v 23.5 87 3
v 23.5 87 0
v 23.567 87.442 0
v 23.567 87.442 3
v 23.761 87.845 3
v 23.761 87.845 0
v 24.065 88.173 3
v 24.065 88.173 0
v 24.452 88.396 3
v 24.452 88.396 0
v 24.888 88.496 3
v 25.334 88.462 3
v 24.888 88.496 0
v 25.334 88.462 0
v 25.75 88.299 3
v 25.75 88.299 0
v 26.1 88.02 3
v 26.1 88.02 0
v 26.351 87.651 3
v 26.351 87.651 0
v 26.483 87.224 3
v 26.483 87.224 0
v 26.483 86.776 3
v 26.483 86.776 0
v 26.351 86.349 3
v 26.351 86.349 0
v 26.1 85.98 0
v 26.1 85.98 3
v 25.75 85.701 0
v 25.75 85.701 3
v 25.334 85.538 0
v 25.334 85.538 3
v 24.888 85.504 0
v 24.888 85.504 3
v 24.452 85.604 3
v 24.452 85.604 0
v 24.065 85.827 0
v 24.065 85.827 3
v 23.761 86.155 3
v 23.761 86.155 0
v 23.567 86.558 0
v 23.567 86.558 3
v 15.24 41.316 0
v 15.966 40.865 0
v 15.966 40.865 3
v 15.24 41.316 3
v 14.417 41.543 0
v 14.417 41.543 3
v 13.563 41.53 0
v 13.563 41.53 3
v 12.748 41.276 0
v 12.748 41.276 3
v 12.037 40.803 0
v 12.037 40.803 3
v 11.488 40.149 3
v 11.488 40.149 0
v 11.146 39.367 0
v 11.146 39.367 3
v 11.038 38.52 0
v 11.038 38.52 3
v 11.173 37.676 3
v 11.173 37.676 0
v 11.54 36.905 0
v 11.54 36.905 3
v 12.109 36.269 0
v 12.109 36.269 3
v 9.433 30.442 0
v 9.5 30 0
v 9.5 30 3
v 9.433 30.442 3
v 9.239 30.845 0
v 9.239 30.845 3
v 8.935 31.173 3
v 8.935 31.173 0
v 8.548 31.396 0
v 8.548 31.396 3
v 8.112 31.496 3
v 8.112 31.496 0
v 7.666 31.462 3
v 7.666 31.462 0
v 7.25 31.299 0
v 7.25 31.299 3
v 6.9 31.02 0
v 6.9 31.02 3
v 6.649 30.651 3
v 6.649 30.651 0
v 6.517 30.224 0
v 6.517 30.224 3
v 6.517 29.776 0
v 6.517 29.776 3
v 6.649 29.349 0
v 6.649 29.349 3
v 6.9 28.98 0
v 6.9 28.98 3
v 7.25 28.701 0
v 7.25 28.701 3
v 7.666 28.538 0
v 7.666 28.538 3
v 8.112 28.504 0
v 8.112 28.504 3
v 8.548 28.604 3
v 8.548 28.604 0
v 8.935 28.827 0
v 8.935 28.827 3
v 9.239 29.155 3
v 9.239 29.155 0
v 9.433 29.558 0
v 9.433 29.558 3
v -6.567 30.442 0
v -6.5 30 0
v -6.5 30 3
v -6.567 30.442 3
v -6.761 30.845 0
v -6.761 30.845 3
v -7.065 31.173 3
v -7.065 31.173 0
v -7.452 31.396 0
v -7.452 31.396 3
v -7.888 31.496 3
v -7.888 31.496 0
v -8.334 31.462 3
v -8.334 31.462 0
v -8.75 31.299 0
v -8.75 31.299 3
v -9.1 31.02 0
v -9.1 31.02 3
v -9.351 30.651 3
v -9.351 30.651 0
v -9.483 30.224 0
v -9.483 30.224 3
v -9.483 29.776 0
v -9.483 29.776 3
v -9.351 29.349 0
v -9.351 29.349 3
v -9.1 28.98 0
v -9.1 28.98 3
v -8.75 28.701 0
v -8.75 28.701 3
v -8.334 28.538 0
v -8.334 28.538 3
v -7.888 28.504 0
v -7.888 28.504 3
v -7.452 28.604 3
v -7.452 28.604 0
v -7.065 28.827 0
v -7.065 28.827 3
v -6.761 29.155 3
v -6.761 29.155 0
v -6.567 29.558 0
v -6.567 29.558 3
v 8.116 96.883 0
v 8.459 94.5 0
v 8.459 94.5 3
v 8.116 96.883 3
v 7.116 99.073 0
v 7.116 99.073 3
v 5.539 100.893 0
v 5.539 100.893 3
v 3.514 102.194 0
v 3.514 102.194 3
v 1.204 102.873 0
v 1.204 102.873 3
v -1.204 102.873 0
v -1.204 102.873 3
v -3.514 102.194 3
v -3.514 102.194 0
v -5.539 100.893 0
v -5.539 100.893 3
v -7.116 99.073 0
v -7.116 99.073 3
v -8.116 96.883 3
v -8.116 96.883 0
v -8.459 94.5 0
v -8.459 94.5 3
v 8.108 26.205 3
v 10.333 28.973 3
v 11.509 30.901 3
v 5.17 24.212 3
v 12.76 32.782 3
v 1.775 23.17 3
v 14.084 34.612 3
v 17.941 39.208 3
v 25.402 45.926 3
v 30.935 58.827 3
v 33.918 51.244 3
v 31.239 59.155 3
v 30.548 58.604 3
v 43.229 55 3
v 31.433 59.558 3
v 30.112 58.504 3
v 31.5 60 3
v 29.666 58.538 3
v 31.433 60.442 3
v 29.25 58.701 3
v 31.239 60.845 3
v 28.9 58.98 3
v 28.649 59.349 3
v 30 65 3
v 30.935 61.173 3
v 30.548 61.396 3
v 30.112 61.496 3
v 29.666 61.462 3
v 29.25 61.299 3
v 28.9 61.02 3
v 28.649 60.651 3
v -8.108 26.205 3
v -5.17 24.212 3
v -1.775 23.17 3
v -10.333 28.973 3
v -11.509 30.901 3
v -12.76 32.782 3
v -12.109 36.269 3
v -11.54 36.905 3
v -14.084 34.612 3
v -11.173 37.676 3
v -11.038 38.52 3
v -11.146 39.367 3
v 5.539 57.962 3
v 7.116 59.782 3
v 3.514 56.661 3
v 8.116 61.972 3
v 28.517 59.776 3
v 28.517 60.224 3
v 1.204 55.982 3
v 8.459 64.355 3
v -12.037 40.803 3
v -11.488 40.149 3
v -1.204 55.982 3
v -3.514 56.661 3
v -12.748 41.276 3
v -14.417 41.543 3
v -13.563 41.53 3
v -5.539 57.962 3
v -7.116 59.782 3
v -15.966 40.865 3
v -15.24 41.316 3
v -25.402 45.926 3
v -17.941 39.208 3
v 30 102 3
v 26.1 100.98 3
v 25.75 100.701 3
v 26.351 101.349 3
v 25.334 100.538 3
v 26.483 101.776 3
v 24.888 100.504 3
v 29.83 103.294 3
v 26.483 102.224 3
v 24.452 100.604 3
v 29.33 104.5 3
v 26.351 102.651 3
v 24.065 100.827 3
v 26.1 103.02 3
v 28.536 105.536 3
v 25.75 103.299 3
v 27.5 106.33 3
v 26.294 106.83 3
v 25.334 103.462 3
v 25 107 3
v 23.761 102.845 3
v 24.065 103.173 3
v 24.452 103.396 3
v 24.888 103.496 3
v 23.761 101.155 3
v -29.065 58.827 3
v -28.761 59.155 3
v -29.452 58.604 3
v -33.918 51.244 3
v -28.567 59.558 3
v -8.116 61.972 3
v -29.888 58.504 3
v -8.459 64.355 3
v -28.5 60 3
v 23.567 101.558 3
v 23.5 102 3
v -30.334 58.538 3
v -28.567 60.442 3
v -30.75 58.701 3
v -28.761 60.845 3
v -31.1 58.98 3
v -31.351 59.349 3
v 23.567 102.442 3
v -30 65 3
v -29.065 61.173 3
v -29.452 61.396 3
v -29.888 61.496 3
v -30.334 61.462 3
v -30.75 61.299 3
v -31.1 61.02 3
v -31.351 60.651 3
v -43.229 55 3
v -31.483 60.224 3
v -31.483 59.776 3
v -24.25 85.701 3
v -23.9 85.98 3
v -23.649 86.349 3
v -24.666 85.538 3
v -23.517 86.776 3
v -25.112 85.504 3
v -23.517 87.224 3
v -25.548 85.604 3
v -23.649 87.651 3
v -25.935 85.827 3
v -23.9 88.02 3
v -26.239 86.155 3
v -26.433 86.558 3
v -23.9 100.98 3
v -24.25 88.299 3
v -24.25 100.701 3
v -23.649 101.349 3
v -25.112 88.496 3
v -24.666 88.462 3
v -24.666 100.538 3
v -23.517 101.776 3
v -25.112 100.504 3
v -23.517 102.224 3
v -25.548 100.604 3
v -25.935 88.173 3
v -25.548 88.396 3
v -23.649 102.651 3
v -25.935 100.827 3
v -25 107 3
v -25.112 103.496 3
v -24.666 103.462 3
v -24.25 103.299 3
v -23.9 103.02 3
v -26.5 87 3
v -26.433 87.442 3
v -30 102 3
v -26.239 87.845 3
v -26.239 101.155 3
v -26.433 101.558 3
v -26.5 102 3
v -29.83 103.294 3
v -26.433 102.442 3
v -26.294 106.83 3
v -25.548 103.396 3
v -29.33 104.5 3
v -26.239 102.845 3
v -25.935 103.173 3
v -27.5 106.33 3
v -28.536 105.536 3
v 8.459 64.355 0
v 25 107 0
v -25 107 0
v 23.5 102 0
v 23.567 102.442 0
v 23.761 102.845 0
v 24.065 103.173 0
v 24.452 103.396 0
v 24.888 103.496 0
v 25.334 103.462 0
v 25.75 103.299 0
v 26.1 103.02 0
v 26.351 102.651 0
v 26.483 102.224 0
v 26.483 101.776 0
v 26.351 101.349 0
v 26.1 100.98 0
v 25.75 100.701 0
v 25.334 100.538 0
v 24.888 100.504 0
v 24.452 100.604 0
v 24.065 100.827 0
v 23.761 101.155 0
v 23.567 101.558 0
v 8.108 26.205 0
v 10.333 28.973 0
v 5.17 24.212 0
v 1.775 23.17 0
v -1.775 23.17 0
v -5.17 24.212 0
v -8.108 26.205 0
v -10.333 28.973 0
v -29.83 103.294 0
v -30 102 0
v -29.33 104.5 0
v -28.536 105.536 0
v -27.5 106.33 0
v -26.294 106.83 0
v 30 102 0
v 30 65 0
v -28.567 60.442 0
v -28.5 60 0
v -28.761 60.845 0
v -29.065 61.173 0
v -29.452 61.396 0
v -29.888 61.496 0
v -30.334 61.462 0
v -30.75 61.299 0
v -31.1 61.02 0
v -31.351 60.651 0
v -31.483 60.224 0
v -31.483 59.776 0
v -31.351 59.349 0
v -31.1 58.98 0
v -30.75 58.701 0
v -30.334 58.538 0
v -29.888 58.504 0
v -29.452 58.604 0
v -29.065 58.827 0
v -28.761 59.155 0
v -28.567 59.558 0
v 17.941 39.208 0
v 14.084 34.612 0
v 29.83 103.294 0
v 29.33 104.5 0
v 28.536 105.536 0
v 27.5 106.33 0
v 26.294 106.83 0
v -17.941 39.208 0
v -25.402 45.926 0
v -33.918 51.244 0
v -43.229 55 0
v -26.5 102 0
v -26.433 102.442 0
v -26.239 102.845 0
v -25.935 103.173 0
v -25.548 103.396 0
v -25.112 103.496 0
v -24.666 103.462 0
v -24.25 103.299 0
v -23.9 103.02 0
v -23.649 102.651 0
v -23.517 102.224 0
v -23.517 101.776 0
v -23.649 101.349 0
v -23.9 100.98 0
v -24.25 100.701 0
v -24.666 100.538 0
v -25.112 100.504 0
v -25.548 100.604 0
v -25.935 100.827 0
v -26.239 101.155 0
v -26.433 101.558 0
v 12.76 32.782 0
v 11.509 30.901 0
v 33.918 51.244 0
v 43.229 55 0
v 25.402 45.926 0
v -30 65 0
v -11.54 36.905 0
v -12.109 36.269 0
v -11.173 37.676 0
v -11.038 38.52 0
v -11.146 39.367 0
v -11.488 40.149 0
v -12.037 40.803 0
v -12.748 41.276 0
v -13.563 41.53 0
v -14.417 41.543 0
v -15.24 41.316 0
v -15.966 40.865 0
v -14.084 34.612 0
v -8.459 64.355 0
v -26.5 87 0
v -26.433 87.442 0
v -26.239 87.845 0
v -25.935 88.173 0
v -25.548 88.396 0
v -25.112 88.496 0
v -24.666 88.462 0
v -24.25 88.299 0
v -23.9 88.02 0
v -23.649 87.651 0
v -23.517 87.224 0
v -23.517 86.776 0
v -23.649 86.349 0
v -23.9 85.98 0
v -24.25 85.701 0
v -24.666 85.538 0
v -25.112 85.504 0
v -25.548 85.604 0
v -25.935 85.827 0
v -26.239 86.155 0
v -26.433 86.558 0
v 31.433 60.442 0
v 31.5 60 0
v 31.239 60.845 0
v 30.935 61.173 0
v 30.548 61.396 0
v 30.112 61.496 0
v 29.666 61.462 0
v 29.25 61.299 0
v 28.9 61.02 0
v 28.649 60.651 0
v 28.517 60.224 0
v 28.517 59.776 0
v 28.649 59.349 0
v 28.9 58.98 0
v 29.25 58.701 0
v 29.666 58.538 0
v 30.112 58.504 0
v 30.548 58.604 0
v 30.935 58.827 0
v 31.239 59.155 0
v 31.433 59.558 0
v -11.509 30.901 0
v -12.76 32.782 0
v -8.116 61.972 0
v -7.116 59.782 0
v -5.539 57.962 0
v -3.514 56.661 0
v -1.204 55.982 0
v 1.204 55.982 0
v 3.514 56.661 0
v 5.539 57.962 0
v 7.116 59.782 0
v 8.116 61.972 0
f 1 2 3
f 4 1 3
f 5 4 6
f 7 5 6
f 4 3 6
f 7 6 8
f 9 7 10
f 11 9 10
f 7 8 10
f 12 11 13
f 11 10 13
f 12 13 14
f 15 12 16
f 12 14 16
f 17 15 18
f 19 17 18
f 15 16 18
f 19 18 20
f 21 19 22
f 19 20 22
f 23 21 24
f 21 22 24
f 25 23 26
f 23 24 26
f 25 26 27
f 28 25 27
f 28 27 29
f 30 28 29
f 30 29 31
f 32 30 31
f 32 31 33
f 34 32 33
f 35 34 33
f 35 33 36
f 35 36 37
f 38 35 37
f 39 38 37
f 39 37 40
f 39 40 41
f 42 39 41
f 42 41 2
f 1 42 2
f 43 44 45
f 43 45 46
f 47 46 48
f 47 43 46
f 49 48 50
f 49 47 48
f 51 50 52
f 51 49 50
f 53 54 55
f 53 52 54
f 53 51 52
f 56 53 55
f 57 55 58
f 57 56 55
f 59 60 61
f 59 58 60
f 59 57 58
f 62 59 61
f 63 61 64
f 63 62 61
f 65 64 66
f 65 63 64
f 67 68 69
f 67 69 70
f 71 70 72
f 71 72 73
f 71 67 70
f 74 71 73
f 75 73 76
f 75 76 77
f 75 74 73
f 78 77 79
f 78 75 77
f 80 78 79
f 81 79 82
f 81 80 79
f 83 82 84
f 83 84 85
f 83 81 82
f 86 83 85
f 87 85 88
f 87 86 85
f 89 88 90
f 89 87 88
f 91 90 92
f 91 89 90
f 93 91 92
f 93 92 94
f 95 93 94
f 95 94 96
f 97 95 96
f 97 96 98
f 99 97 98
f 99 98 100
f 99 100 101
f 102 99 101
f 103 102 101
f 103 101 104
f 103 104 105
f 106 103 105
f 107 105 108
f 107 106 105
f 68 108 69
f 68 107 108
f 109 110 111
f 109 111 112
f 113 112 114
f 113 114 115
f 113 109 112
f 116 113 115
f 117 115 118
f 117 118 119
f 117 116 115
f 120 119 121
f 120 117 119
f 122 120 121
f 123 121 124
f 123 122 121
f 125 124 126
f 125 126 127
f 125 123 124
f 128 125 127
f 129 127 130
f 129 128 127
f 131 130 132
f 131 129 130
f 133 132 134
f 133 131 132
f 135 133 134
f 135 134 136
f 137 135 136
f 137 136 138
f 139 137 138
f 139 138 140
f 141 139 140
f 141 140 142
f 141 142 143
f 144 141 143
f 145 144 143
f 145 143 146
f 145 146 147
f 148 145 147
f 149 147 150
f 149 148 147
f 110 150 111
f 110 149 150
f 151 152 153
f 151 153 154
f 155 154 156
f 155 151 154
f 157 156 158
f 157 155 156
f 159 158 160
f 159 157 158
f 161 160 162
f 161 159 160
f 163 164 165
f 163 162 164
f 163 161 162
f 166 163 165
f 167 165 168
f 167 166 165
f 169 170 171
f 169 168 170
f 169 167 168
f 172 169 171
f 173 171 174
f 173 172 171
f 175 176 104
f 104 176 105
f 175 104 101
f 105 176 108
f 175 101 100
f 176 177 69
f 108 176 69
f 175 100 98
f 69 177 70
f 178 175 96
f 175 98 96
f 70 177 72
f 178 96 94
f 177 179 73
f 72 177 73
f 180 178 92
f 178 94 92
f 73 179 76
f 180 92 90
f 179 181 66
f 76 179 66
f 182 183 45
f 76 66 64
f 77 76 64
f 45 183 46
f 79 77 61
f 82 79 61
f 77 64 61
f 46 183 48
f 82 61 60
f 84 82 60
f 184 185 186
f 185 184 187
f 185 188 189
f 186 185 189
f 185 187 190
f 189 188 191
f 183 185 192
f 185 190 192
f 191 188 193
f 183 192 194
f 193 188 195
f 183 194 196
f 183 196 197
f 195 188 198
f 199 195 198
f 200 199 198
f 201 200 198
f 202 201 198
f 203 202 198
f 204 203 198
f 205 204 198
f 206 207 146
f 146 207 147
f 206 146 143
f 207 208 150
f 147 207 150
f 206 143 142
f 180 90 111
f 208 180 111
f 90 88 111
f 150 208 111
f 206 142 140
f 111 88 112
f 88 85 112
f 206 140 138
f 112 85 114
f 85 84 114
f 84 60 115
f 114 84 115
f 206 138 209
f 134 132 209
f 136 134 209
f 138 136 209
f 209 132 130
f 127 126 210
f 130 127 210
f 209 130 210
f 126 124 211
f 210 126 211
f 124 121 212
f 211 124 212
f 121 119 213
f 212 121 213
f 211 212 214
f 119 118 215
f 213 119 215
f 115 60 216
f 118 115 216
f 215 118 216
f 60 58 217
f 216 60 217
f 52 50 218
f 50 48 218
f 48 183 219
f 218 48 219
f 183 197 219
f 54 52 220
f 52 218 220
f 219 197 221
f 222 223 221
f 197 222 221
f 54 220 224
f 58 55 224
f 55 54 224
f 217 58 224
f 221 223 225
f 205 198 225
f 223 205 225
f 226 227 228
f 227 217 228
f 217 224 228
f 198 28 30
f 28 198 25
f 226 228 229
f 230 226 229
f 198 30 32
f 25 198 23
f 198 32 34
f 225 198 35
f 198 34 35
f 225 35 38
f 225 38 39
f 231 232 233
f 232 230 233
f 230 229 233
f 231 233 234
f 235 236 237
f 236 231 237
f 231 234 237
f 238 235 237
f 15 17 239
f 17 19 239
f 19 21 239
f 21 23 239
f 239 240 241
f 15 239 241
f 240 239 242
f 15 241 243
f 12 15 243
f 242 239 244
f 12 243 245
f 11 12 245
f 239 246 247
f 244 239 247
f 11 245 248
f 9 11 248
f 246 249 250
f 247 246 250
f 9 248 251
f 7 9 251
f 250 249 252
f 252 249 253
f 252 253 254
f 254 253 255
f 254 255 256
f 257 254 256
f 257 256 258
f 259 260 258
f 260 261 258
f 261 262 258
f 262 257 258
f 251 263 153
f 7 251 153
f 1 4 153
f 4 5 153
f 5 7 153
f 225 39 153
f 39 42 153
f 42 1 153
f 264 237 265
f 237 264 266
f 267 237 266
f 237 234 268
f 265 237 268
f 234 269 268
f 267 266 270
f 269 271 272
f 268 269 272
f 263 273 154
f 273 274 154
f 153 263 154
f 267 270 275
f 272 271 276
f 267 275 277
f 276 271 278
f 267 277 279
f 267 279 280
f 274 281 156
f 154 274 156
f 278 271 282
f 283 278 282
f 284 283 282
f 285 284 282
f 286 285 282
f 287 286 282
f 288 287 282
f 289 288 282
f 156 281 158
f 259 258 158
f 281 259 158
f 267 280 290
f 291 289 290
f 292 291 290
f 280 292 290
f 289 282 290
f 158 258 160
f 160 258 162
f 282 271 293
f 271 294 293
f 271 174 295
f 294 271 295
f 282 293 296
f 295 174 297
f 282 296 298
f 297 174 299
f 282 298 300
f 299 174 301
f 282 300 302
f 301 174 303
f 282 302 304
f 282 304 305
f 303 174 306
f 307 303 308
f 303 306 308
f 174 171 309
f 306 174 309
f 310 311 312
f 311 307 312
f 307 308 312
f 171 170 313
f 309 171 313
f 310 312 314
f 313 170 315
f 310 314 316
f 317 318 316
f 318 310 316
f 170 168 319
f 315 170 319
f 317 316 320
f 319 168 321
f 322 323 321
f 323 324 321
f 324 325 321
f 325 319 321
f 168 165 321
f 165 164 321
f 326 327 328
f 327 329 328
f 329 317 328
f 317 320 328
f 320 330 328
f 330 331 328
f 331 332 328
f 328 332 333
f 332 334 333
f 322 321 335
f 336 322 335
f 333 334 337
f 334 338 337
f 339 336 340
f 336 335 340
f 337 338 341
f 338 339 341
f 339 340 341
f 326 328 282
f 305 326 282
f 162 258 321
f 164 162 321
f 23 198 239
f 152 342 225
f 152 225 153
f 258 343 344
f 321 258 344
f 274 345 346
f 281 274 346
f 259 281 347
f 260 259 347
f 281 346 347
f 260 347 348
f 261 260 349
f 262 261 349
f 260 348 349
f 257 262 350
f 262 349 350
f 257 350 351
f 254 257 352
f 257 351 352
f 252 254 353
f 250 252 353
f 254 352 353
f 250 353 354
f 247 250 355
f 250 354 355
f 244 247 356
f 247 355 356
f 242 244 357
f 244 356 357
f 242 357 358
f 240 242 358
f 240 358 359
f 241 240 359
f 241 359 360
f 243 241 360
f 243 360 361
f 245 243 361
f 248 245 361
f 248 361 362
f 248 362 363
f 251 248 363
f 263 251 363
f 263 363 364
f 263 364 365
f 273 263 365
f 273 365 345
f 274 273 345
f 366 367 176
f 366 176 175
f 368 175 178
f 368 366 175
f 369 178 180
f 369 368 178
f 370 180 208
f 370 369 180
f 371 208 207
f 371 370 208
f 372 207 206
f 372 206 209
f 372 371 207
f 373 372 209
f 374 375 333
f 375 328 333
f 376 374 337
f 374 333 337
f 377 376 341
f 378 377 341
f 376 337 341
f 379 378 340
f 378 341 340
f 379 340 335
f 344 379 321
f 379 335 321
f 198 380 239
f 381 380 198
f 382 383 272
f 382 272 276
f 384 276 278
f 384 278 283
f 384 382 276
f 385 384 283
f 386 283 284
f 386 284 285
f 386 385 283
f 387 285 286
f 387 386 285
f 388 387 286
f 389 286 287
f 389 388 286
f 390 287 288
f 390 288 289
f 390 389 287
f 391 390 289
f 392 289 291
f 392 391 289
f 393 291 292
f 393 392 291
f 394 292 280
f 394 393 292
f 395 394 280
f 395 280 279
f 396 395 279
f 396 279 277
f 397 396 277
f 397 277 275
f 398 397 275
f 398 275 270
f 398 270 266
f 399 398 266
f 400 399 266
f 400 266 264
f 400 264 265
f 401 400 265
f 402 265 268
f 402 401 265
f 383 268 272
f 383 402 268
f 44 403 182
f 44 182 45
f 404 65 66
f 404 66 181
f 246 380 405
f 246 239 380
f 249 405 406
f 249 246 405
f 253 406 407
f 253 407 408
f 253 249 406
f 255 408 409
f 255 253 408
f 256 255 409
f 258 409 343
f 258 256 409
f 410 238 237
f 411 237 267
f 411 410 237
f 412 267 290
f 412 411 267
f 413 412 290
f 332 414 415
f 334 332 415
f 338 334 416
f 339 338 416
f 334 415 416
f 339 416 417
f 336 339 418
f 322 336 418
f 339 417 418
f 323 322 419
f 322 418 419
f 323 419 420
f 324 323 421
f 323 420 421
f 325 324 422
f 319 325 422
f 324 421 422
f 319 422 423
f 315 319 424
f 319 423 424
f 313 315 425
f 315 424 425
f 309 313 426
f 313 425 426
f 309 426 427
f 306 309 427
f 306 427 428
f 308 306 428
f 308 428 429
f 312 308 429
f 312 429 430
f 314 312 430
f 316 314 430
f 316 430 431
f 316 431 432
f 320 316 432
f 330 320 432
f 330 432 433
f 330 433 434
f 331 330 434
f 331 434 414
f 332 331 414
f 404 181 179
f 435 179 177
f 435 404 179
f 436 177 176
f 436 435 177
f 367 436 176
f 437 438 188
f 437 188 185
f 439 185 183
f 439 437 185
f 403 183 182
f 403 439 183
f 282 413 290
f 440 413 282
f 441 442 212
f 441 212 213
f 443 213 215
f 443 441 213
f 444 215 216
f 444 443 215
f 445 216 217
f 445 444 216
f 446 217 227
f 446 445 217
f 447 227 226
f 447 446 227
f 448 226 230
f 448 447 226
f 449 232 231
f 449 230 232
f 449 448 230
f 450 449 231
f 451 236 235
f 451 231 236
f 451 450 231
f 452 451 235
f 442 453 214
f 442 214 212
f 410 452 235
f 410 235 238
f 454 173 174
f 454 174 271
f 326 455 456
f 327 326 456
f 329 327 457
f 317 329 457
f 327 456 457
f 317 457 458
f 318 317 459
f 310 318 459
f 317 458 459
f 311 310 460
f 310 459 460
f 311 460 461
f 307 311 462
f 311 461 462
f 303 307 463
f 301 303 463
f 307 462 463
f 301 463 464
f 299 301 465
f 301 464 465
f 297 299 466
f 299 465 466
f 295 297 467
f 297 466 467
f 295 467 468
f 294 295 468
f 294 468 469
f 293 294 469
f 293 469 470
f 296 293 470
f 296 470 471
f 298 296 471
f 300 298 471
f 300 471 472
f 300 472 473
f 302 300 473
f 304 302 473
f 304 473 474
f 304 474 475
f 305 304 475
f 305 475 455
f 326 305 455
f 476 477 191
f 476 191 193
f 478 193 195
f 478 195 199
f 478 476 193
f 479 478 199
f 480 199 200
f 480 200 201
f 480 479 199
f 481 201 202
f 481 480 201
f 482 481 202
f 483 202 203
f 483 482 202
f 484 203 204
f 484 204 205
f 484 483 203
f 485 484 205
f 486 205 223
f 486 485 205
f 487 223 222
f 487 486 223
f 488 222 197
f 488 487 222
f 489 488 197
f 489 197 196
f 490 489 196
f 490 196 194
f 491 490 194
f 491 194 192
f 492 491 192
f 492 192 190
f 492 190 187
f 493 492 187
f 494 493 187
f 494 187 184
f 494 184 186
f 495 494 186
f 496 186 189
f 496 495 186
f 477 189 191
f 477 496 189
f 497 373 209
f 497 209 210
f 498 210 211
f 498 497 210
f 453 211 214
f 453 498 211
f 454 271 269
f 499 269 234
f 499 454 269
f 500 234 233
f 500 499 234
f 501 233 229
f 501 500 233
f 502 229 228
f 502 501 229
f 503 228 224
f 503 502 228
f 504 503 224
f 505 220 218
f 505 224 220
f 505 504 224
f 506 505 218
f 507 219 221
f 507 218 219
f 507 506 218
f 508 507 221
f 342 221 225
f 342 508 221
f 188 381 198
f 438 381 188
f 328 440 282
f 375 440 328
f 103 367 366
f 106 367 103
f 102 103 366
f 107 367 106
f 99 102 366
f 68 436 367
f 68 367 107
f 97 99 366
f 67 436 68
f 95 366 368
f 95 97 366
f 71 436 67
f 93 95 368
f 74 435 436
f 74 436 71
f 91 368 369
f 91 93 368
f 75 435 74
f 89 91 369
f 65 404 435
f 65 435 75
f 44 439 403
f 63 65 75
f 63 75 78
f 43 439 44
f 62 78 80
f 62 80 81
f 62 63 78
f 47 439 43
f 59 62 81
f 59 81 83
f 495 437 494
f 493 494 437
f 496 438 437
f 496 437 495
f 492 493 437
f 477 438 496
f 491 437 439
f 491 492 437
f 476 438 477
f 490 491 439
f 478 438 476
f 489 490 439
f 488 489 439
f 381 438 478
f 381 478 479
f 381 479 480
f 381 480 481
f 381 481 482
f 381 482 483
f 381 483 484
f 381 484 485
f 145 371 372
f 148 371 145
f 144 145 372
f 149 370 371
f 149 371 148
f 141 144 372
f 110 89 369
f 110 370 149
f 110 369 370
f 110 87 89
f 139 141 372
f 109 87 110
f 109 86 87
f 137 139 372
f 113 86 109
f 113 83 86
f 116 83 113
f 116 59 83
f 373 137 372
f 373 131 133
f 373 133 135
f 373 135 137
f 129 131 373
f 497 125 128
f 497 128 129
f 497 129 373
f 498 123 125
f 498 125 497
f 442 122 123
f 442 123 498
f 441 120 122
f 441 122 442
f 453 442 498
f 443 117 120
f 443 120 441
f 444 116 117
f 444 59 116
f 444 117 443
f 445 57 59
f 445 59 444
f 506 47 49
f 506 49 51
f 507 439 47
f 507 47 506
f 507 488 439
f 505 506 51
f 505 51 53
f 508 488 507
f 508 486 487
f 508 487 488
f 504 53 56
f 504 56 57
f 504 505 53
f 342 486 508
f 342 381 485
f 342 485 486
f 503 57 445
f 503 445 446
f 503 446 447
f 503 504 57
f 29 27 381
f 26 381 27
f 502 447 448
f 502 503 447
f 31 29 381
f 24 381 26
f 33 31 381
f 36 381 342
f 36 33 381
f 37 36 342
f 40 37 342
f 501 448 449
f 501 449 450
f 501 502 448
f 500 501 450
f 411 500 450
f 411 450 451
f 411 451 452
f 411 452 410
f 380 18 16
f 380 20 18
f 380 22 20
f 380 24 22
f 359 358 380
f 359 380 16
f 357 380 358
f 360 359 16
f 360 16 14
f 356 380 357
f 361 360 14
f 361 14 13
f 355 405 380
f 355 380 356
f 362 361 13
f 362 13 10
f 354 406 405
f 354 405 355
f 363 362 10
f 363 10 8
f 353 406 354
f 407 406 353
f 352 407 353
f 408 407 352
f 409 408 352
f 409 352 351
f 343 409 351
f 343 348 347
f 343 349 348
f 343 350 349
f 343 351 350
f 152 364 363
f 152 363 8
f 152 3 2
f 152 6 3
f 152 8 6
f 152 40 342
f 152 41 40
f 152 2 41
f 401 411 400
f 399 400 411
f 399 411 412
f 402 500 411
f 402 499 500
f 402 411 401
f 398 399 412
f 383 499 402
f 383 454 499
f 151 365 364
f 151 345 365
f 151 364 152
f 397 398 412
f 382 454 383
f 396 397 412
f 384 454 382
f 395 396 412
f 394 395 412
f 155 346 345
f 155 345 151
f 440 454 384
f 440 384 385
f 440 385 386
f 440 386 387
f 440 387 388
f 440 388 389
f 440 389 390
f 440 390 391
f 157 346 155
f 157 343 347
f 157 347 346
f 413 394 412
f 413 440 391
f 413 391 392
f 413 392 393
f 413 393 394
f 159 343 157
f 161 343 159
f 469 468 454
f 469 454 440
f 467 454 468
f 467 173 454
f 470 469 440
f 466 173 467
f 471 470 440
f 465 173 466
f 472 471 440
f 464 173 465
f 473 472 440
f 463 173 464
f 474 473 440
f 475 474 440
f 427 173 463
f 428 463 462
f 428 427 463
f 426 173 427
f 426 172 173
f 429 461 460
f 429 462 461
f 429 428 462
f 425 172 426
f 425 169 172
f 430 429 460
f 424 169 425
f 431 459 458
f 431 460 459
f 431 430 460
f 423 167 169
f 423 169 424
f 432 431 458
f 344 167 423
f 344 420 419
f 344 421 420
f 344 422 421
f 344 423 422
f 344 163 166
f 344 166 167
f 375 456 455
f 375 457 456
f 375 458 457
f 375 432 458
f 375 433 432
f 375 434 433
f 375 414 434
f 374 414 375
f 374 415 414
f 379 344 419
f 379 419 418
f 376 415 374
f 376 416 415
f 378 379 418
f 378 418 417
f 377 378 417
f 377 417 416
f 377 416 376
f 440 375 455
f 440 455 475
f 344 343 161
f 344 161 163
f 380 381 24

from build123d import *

# Parameters (mm, degrees)
SKETCH_1_R          = 1.5
EXTRUDE_1_DEPTH     = 3
CUT_EXTRUDE_1_DEPTH = 10
SKETCH_3_R          = 1.5
CUT_EXTRUDE_2_DEPTH = 10
SKETCH_4_R          = 1
SKETCH_4_W          = 12.5
SKETCH_4_H          = 22.5
EXTRUDE_2_DEPTH     = 3
SKETCH_5_R          = 1
CUT_EXTRUDE_3_DEPTH = 10
FILLET_1_R          = 10
CUT_EXTRUDE_4_DEPTH = 10
FILLET_2_R          = 5


with BuildPart() as part:
    # 草图1 → 凸台-拉伸1 (new body)
    with BuildSketch(Plane.XY):
        with BuildLine():
            Line((30, 65), (43.229490169, 55))
            ThreePointArc((43.229490169, 55), (24.322951332, 45.093216766), (10.332713198, 28.972583968))
            ThreePointArc((10.332713198, 28.972583968), (0, 23.037780053), (-10.332713198, 28.972583968))
            ThreePointArc((-10.332713198, 28.972583968), (-24.322951332, 45.093216766), (-43.229490169, 55))
            Line((-43.229490169, 55), (-30, 65))
            Line((-30, 65), (-30, 107))
            ThreePointArc((-30, 107), (-27.071067812, 114.071067812), (-20, 117))
            Line((-20, 117), (20, 117))
            ThreePointArc((20, 117), (27.071067812, 114.071067812), (30, 107))
            Line((30, 107), (30, 65))
        make_face()
        with Locations((-30, 60)):
            Circle(SKETCH_1_R, mode=Mode.SUBTRACT)
        with Locations((-8, 30)):
            Circle(SKETCH_1_R, mode=Mode.SUBTRACT)
        with Locations((8, 30)):
            Circle(SKETCH_1_R, mode=Mode.SUBTRACT)
        with Locations((30, 60)):
            Circle(SKETCH_1_R, mode=Mode.SUBTRACT)
    extrude(amount=EXTRUDE_1_DEPTH)

    # 草图2 → 切除-拉伸1 (cut)
    with BuildSketch(Plane(origin=(0, 0, 0), x_dir=(-1, 0, 0), z_dir=(0, 0, -1))):
        with BuildLine():
            Line((14.08407385, 34.61181483), (12.108970584, 36.269123252))
            ThreePointArc((12.108970584, 36.269123252), (11.739200084, 40.49561941), (15.965696242, 40.865389911))
            Line((15.965696242, 40.865389911), (17.940799508, 39.208081488))
            Line((17.940799508, 39.208081488), (18.60524138, 38.39769253))
            Line((18.60524138, 38.39769253), (14.816805035, 33.83995685))
            Line((14.816805035, 33.83995685), (14.08407385, 34.61181483))
        make_face()
        with BuildLine():
            Line((-18.60524138, 38.39769253), (-17.940799508, 39.208081488))
            Line((-17.940799508, 39.208081488), (-15.965696242, 40.865389911))
            ThreePointArc((-15.965696242, 40.865389911), (-11.739200084, 40.49561941), (-12.108970584, 36.269123252))
            Line((-12.108970584, 36.269123252), (-14.08407385, 34.61181483))
            Line((-14.08407385, 34.61181483), (-14.816805035, 33.83995685))
            Line((-14.816805035, 33.83995685), (-18.60524138, 38.39769253))
        make_face()
    extrude(amount=-CUT_EXTRUDE_1_DEPTH, mode=Mode.SUBTRACT)

    # 草图3 → 切除-拉伸2 (cut)
    with BuildSketch(Plane(origin=(0, 0, 0), x_dir=(-1, 0, 0), z_dir=(0, 0, -1))):
        with Locations((-25, 102)):
            Circle(SKETCH_3_R)
        with Locations((-25, 87)):
            Circle(SKETCH_3_R)
        with Locations((25, 102)):
            Circle(SKETCH_3_R)
        with Locations((25, 87)):
            Circle(SKETCH_3_R)
        with BuildLine():
            Line((-8.458896236, 64.355158964), (-8.458896236, 94.5))
            ThreePointArc((-8.458896236, 94.5), (0, 102.958896236), (8.458896236, 94.5))
            Line((8.458896236, 94.5), (8.458896236, 64.355158964))
            ThreePointArc((8.458896236, 64.355158964), (0, 55.896262728), (-8.458896236, 64.355158964))
        make_face()
    extrude(amount=-CUT_EXTRUDE_2_DEPTH, mode=Mode.SUBTRACT)

    # 草图4 → 凸台-拉伸2 (add)
    with BuildSketch(Plane(origin=(0, 0, 0), x_dir=(-1, 0, 0), z_dir=(0, 0, -1))):
        with BuildLine():
            Line((-9.51564662, 141.75), (-20, 117))
            Line((-20, 117), (-9.51564662, 117))
            Line((-9.51564662, 117), (-2.844735856, 108.972139798))
            Line((-2.844735856, 108.972139798), (9.51564662, 117))
            Line((9.51564662, 117), (20, 117))
            Line((20, 117), (9.51564662, 141.75))
            ThreePointArc((9.51564662, 141.75), (0, 151.26564662), (-9.51564662, 141.75))
        make_face()
        with Locations((0, 141.75)):
            Circle(SKETCH_4_R, mode=Mode.SUBTRACT)
        with Locations((0, 128.25)):
            Rectangle(SKETCH_4_W, SKETCH_4_H, mode=Mode.SUBTRACT)
    extrude(amount=-EXTRUDE_2_DEPTH)

    # 草图5 → 切除-拉伸3 (cut)
    with BuildSketch(Plane(origin=(0, 0, 0), x_dir=(-1, 0, 0), z_dir=(0, 0, -1))):
        with Locations((0, 114.75)):
            Circle(SKETCH_5_R)
    extrude(amount=-CUT_EXTRUDE_3_DEPTH, mode=Mode.SUBTRACT)

    # 圆角1
    fillet_1_edges = [part.edges().sort_by_distance(p)[0] for p in [
        (9.51564662, 141.75, 1.5),
        (-9.51564662, 141.75, 1.5),
        (-20, 117, 1.5),
        (20, 117, 1.5),
    ]]
    fillet(fillet_1_edges, radius=FILLET_1_R)

    # 草图6 → 切除-拉伸4 (cut)
    with BuildSketch(Plane(origin=(0, 0, 0), x_dir=(-1, 0, 0), z_dir=(0, 0, -1))):
        Polygon((-30, 107), (30, 107), (76.168650248, 160.022811959), (-16.915973461, 154.626601889), (-34.871476016, 113.990464525), align=None)
    extrude(amount=-CUT_EXTRUDE_4_DEPTH, mode=Mode.SUBTRACT)

    # 圆角2
    fillet_2_edges = [part.edges().sort_by_distance(p)[0] for p in [
        (30, 107, 1.5),
        (-30, 107, 1.5),
    ]]
    fillet(fillet_2_edges, radius=FILLET_2_R)


solid = part.part
